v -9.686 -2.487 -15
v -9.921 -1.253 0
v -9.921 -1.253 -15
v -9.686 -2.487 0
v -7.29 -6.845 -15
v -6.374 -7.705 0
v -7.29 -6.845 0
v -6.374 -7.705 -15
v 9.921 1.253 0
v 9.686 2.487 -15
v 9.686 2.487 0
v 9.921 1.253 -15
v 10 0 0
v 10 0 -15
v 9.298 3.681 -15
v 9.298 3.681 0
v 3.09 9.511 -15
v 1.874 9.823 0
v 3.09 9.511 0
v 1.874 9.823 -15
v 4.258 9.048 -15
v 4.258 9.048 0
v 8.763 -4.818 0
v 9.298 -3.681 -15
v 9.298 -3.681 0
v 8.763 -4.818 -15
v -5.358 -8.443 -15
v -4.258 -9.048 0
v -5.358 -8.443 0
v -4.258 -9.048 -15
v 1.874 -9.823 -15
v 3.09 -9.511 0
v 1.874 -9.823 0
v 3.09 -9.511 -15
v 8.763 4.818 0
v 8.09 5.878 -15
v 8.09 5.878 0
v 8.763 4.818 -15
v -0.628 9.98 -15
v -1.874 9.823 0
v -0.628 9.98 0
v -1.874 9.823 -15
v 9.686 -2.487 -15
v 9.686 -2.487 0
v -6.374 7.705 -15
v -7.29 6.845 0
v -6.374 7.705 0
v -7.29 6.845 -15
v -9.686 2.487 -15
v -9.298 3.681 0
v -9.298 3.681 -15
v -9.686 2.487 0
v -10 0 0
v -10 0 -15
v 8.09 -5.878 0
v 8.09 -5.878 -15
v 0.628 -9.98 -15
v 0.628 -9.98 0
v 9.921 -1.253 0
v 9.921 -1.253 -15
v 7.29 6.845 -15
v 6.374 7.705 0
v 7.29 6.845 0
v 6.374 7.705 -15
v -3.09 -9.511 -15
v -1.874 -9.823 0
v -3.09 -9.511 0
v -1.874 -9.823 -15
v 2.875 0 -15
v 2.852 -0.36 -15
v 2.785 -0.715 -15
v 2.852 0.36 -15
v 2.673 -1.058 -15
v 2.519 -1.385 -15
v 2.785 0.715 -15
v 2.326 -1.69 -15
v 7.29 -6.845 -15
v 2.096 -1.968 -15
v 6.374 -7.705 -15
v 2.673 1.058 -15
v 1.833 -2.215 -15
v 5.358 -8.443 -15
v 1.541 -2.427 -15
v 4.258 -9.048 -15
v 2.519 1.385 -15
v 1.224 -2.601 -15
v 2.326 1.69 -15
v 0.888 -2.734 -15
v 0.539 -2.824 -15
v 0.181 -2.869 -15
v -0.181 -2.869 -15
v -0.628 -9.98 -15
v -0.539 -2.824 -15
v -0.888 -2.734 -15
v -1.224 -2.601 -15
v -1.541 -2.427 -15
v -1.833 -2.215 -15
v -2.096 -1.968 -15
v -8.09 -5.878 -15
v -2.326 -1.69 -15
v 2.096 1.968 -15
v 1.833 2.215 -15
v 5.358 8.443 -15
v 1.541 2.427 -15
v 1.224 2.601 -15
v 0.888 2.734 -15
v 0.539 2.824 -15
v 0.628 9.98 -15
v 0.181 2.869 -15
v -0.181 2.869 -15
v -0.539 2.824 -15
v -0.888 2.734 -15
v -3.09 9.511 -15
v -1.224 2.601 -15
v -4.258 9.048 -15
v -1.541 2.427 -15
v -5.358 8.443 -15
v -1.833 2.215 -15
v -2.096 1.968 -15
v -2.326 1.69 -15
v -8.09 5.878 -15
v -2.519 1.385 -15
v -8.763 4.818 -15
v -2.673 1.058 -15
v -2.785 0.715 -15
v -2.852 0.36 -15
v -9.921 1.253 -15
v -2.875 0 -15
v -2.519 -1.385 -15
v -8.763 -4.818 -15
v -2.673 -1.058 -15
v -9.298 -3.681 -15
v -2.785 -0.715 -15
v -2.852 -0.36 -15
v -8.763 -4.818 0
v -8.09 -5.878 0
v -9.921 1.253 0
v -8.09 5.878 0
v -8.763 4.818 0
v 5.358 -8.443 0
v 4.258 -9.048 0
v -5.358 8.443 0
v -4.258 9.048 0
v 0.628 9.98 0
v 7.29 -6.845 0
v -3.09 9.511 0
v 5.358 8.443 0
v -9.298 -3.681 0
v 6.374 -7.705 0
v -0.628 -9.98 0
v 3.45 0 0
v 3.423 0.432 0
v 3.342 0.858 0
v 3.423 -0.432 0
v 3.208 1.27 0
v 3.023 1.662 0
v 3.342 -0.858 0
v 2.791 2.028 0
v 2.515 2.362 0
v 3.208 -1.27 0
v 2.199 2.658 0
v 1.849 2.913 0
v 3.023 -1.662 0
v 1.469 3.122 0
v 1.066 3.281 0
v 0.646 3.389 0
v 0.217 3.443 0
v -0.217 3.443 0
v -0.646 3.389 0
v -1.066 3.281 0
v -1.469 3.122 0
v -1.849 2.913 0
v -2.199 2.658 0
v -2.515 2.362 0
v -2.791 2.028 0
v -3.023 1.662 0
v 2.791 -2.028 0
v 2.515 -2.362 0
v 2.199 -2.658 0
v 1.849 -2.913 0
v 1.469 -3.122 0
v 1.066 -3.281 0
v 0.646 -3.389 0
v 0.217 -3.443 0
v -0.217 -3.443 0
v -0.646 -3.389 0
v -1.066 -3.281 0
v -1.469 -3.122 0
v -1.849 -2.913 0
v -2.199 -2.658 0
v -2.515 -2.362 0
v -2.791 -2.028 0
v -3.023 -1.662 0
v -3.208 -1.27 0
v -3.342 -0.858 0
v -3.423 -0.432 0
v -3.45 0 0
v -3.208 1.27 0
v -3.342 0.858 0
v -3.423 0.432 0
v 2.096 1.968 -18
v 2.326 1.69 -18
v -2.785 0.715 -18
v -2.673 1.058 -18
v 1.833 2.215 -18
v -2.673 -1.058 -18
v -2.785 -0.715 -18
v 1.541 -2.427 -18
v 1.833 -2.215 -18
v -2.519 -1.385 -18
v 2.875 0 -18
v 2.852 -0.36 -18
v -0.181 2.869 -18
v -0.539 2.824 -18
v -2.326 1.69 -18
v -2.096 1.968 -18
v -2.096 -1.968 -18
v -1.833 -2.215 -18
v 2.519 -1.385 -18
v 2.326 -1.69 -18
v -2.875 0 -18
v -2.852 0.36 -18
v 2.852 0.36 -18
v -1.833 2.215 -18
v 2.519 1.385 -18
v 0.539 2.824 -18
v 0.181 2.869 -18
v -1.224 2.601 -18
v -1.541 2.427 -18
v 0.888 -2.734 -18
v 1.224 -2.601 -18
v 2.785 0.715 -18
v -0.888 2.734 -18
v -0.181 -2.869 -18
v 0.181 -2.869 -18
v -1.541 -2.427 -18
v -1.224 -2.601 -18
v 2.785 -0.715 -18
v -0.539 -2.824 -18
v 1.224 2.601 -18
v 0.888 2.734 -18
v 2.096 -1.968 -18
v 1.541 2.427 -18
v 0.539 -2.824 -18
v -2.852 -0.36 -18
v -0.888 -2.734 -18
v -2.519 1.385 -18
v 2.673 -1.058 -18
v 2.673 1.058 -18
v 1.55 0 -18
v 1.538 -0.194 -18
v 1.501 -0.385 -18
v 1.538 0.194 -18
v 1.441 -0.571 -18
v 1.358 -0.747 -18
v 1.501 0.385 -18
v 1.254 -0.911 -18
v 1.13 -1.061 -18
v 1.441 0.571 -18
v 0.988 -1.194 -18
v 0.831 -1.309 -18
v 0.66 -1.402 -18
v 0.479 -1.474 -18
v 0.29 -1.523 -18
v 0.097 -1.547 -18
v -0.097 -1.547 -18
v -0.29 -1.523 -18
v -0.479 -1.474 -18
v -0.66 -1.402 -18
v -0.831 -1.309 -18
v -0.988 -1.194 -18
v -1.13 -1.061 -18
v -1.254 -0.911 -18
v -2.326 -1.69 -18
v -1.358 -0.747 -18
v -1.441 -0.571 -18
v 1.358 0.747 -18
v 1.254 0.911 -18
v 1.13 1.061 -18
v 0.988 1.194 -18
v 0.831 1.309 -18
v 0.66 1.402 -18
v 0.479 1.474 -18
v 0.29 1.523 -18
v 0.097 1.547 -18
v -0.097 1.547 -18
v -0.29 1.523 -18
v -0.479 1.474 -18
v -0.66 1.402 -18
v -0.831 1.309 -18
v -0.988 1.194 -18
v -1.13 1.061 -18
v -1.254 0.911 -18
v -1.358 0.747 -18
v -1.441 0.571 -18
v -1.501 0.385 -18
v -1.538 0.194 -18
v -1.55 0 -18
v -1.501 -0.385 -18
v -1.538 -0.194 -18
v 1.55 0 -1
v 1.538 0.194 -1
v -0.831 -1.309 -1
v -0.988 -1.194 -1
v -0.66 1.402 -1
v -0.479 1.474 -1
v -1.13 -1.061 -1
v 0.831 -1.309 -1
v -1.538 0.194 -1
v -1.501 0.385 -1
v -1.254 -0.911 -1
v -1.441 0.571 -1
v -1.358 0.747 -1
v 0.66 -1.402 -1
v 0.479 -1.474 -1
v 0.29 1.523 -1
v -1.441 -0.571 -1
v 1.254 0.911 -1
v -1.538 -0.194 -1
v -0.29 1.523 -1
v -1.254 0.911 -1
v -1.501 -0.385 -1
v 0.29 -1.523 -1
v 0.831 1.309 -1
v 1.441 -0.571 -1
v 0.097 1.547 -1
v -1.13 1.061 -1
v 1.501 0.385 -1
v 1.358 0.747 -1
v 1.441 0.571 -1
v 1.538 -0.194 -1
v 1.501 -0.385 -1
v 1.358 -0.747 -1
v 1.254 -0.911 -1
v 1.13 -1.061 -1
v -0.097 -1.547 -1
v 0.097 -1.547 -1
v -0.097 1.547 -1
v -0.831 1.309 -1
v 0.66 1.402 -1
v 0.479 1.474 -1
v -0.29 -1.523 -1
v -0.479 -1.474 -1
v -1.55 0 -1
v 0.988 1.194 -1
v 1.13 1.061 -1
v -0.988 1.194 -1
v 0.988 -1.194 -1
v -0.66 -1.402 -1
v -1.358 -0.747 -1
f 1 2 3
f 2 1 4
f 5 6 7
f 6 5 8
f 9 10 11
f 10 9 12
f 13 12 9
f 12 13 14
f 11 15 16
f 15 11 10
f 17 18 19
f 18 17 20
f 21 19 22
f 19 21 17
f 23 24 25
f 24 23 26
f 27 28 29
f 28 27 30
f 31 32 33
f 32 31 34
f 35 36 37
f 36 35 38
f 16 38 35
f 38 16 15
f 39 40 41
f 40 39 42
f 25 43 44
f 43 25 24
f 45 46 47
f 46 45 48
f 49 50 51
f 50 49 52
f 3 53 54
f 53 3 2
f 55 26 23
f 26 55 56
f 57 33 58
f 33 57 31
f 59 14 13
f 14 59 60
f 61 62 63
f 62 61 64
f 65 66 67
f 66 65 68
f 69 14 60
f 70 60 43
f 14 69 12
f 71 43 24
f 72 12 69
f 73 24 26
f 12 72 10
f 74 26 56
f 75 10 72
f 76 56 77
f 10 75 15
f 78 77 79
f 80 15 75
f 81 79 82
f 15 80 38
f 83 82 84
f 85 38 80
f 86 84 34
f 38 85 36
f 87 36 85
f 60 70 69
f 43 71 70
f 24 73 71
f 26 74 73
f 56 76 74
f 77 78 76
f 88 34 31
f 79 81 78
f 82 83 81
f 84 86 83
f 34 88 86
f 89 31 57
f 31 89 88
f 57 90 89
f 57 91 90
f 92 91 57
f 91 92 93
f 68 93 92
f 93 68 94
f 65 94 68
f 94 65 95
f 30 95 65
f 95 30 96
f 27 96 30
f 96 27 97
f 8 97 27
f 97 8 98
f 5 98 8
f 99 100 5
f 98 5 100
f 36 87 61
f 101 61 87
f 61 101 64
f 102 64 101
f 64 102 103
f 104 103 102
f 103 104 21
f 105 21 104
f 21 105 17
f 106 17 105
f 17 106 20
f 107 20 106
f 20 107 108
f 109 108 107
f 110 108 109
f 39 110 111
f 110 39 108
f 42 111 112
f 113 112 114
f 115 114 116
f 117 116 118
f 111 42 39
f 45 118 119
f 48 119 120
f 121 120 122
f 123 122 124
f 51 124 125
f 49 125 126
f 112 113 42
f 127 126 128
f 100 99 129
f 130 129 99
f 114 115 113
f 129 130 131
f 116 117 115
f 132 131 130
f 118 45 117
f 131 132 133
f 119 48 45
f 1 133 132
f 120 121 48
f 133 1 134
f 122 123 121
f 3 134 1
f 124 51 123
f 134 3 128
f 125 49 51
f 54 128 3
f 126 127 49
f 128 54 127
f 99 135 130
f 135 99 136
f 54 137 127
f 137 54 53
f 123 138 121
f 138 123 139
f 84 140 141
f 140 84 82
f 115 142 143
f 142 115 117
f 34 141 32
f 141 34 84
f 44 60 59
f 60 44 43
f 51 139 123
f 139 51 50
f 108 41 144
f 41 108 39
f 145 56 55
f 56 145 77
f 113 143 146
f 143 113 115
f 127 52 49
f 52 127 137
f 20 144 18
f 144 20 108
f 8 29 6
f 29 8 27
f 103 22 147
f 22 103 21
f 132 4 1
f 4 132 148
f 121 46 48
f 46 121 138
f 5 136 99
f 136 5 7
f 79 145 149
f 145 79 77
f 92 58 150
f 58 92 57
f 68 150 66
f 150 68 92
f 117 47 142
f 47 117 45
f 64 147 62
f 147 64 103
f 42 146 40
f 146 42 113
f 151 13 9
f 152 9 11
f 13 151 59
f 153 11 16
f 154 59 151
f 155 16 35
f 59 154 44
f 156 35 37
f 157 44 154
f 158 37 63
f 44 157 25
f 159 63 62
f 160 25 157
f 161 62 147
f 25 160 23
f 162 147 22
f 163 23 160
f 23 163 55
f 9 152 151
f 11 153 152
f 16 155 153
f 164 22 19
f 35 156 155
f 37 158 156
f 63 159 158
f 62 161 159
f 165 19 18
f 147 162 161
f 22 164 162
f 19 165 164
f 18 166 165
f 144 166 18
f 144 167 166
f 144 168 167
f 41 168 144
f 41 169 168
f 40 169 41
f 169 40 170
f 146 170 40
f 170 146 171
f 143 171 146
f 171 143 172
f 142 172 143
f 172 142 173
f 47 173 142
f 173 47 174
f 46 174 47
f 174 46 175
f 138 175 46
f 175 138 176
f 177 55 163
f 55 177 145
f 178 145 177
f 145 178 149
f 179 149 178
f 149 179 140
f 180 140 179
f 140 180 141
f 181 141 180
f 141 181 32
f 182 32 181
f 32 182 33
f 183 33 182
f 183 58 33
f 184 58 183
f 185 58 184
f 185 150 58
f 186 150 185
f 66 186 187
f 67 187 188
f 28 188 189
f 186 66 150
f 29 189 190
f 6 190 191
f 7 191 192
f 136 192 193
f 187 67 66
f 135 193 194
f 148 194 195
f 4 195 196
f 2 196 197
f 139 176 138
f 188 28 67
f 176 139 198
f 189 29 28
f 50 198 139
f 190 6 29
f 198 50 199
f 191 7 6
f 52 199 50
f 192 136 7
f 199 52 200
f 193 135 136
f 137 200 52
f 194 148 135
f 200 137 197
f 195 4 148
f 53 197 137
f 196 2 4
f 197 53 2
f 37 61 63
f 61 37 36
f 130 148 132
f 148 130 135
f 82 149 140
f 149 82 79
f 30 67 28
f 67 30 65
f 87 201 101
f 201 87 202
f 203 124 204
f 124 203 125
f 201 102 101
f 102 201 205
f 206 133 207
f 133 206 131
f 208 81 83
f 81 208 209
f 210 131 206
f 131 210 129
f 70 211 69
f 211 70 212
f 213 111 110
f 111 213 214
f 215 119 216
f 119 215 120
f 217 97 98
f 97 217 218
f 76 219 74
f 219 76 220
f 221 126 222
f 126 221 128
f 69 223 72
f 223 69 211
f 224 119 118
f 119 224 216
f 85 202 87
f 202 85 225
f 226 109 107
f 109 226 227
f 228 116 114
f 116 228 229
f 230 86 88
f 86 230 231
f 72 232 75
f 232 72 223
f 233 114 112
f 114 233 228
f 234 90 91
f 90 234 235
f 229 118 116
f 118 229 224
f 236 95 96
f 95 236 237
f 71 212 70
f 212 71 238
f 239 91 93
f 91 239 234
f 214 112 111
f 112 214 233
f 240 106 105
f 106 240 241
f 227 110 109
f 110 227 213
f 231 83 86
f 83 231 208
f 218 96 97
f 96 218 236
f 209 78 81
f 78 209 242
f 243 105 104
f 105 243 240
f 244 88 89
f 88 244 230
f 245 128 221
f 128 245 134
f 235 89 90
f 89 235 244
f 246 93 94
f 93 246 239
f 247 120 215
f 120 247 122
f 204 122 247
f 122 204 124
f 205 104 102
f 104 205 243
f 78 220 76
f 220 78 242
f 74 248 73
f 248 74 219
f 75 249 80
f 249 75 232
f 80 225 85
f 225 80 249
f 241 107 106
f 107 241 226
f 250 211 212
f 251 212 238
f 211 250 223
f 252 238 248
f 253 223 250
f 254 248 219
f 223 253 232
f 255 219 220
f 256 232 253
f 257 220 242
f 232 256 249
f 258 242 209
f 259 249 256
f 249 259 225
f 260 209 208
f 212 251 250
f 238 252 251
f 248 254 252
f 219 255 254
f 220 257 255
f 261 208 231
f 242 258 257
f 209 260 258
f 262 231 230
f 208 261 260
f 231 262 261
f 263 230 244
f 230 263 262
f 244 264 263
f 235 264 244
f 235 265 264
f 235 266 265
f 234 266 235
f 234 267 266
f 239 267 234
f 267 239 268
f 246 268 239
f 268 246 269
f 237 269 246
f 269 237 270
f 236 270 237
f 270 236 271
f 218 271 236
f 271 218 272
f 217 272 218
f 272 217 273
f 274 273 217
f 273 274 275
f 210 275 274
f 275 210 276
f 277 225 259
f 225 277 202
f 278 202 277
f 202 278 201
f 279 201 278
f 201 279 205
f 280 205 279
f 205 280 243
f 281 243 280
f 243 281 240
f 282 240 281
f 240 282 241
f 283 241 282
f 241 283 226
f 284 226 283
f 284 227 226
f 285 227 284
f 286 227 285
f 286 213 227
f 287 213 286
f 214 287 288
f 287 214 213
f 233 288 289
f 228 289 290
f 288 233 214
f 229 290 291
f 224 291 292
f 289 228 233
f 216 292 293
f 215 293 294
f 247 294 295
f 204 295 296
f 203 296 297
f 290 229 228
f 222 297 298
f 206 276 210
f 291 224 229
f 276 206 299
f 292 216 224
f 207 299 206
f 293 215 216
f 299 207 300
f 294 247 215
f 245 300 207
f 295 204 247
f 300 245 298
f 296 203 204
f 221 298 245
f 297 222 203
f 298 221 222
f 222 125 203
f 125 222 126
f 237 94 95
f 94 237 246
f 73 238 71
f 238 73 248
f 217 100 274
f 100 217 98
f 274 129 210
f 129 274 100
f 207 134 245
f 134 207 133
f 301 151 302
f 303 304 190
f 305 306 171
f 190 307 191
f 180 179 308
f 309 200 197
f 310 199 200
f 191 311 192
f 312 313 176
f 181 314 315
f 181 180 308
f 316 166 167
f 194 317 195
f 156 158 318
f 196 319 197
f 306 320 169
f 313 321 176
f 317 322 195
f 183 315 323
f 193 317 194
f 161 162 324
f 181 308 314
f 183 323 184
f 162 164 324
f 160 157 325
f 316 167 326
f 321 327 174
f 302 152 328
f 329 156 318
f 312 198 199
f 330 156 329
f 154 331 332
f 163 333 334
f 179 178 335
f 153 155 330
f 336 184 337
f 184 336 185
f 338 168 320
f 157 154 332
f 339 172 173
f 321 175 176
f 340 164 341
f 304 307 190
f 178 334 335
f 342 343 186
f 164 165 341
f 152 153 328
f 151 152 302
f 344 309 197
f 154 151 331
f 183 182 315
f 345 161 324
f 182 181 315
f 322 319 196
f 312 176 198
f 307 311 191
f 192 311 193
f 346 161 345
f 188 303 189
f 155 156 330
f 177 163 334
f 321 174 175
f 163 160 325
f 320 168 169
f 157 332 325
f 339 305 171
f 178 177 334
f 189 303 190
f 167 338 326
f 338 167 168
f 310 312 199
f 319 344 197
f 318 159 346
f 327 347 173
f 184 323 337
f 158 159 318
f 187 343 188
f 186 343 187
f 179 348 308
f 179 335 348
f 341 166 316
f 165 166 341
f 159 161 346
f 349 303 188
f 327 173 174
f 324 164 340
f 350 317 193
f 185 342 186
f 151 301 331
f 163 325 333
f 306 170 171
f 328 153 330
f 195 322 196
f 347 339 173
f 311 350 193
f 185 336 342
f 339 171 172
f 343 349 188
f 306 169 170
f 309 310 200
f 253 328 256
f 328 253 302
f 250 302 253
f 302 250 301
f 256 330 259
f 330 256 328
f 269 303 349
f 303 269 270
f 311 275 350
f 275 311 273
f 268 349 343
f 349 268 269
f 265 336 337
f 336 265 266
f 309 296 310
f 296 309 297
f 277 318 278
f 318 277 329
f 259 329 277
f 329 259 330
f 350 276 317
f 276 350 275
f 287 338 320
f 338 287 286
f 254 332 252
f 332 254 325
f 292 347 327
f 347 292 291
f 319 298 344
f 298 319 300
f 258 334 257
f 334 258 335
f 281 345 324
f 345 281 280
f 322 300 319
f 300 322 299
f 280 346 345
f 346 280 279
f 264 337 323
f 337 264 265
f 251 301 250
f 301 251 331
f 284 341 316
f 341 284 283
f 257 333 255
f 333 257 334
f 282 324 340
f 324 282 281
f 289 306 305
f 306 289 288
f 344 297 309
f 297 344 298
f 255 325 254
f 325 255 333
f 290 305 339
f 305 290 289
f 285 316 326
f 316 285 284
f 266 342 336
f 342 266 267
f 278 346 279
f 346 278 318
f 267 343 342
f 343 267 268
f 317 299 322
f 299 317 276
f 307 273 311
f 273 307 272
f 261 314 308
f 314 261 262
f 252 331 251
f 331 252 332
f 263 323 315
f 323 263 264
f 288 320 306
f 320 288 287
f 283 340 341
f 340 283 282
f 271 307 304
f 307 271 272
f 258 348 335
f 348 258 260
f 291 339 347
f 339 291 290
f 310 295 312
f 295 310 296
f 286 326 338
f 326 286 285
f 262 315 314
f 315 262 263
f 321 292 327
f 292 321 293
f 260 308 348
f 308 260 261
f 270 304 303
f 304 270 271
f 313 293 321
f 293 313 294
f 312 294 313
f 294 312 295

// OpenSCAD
$fn = 50;


difference() {
	union() {
		translate(v = [0, 0, -15.0000000000]) {
			cylinder(h = 15, r = 10.0000000000);
		}
		#translate(v = [0, 0, -18.0000000000]) {
			cylinder(h = 18, r = 2.8750000000);
		}
	}
	union() {
		translate(v = [0, 0, 0]) {
			rotate(a = [0, 0, 0]) {
				difference() {
					union() {
						translate(v = [0, 0, -18.0000000000]) {
							cylinder(h = 18, r = 1.2500000000);
						}
						translate(v = [0, 0, -1.0000000000]) {
							cylinder(h = 1.0000000000, r1 = 1.5500000000, r2 = 3.4500000000);
						}
						translate(v = [0, 0, -18.0000000000]) {
							cylinder(h = 18, r = 1.5500000000);
						}
						translate(v = [0, 0, -18.0000000000]) {
							cylinder(h = 18, r = 1.2500000000);
						}
					}
					union();
				}
			}
		}
	}
}
